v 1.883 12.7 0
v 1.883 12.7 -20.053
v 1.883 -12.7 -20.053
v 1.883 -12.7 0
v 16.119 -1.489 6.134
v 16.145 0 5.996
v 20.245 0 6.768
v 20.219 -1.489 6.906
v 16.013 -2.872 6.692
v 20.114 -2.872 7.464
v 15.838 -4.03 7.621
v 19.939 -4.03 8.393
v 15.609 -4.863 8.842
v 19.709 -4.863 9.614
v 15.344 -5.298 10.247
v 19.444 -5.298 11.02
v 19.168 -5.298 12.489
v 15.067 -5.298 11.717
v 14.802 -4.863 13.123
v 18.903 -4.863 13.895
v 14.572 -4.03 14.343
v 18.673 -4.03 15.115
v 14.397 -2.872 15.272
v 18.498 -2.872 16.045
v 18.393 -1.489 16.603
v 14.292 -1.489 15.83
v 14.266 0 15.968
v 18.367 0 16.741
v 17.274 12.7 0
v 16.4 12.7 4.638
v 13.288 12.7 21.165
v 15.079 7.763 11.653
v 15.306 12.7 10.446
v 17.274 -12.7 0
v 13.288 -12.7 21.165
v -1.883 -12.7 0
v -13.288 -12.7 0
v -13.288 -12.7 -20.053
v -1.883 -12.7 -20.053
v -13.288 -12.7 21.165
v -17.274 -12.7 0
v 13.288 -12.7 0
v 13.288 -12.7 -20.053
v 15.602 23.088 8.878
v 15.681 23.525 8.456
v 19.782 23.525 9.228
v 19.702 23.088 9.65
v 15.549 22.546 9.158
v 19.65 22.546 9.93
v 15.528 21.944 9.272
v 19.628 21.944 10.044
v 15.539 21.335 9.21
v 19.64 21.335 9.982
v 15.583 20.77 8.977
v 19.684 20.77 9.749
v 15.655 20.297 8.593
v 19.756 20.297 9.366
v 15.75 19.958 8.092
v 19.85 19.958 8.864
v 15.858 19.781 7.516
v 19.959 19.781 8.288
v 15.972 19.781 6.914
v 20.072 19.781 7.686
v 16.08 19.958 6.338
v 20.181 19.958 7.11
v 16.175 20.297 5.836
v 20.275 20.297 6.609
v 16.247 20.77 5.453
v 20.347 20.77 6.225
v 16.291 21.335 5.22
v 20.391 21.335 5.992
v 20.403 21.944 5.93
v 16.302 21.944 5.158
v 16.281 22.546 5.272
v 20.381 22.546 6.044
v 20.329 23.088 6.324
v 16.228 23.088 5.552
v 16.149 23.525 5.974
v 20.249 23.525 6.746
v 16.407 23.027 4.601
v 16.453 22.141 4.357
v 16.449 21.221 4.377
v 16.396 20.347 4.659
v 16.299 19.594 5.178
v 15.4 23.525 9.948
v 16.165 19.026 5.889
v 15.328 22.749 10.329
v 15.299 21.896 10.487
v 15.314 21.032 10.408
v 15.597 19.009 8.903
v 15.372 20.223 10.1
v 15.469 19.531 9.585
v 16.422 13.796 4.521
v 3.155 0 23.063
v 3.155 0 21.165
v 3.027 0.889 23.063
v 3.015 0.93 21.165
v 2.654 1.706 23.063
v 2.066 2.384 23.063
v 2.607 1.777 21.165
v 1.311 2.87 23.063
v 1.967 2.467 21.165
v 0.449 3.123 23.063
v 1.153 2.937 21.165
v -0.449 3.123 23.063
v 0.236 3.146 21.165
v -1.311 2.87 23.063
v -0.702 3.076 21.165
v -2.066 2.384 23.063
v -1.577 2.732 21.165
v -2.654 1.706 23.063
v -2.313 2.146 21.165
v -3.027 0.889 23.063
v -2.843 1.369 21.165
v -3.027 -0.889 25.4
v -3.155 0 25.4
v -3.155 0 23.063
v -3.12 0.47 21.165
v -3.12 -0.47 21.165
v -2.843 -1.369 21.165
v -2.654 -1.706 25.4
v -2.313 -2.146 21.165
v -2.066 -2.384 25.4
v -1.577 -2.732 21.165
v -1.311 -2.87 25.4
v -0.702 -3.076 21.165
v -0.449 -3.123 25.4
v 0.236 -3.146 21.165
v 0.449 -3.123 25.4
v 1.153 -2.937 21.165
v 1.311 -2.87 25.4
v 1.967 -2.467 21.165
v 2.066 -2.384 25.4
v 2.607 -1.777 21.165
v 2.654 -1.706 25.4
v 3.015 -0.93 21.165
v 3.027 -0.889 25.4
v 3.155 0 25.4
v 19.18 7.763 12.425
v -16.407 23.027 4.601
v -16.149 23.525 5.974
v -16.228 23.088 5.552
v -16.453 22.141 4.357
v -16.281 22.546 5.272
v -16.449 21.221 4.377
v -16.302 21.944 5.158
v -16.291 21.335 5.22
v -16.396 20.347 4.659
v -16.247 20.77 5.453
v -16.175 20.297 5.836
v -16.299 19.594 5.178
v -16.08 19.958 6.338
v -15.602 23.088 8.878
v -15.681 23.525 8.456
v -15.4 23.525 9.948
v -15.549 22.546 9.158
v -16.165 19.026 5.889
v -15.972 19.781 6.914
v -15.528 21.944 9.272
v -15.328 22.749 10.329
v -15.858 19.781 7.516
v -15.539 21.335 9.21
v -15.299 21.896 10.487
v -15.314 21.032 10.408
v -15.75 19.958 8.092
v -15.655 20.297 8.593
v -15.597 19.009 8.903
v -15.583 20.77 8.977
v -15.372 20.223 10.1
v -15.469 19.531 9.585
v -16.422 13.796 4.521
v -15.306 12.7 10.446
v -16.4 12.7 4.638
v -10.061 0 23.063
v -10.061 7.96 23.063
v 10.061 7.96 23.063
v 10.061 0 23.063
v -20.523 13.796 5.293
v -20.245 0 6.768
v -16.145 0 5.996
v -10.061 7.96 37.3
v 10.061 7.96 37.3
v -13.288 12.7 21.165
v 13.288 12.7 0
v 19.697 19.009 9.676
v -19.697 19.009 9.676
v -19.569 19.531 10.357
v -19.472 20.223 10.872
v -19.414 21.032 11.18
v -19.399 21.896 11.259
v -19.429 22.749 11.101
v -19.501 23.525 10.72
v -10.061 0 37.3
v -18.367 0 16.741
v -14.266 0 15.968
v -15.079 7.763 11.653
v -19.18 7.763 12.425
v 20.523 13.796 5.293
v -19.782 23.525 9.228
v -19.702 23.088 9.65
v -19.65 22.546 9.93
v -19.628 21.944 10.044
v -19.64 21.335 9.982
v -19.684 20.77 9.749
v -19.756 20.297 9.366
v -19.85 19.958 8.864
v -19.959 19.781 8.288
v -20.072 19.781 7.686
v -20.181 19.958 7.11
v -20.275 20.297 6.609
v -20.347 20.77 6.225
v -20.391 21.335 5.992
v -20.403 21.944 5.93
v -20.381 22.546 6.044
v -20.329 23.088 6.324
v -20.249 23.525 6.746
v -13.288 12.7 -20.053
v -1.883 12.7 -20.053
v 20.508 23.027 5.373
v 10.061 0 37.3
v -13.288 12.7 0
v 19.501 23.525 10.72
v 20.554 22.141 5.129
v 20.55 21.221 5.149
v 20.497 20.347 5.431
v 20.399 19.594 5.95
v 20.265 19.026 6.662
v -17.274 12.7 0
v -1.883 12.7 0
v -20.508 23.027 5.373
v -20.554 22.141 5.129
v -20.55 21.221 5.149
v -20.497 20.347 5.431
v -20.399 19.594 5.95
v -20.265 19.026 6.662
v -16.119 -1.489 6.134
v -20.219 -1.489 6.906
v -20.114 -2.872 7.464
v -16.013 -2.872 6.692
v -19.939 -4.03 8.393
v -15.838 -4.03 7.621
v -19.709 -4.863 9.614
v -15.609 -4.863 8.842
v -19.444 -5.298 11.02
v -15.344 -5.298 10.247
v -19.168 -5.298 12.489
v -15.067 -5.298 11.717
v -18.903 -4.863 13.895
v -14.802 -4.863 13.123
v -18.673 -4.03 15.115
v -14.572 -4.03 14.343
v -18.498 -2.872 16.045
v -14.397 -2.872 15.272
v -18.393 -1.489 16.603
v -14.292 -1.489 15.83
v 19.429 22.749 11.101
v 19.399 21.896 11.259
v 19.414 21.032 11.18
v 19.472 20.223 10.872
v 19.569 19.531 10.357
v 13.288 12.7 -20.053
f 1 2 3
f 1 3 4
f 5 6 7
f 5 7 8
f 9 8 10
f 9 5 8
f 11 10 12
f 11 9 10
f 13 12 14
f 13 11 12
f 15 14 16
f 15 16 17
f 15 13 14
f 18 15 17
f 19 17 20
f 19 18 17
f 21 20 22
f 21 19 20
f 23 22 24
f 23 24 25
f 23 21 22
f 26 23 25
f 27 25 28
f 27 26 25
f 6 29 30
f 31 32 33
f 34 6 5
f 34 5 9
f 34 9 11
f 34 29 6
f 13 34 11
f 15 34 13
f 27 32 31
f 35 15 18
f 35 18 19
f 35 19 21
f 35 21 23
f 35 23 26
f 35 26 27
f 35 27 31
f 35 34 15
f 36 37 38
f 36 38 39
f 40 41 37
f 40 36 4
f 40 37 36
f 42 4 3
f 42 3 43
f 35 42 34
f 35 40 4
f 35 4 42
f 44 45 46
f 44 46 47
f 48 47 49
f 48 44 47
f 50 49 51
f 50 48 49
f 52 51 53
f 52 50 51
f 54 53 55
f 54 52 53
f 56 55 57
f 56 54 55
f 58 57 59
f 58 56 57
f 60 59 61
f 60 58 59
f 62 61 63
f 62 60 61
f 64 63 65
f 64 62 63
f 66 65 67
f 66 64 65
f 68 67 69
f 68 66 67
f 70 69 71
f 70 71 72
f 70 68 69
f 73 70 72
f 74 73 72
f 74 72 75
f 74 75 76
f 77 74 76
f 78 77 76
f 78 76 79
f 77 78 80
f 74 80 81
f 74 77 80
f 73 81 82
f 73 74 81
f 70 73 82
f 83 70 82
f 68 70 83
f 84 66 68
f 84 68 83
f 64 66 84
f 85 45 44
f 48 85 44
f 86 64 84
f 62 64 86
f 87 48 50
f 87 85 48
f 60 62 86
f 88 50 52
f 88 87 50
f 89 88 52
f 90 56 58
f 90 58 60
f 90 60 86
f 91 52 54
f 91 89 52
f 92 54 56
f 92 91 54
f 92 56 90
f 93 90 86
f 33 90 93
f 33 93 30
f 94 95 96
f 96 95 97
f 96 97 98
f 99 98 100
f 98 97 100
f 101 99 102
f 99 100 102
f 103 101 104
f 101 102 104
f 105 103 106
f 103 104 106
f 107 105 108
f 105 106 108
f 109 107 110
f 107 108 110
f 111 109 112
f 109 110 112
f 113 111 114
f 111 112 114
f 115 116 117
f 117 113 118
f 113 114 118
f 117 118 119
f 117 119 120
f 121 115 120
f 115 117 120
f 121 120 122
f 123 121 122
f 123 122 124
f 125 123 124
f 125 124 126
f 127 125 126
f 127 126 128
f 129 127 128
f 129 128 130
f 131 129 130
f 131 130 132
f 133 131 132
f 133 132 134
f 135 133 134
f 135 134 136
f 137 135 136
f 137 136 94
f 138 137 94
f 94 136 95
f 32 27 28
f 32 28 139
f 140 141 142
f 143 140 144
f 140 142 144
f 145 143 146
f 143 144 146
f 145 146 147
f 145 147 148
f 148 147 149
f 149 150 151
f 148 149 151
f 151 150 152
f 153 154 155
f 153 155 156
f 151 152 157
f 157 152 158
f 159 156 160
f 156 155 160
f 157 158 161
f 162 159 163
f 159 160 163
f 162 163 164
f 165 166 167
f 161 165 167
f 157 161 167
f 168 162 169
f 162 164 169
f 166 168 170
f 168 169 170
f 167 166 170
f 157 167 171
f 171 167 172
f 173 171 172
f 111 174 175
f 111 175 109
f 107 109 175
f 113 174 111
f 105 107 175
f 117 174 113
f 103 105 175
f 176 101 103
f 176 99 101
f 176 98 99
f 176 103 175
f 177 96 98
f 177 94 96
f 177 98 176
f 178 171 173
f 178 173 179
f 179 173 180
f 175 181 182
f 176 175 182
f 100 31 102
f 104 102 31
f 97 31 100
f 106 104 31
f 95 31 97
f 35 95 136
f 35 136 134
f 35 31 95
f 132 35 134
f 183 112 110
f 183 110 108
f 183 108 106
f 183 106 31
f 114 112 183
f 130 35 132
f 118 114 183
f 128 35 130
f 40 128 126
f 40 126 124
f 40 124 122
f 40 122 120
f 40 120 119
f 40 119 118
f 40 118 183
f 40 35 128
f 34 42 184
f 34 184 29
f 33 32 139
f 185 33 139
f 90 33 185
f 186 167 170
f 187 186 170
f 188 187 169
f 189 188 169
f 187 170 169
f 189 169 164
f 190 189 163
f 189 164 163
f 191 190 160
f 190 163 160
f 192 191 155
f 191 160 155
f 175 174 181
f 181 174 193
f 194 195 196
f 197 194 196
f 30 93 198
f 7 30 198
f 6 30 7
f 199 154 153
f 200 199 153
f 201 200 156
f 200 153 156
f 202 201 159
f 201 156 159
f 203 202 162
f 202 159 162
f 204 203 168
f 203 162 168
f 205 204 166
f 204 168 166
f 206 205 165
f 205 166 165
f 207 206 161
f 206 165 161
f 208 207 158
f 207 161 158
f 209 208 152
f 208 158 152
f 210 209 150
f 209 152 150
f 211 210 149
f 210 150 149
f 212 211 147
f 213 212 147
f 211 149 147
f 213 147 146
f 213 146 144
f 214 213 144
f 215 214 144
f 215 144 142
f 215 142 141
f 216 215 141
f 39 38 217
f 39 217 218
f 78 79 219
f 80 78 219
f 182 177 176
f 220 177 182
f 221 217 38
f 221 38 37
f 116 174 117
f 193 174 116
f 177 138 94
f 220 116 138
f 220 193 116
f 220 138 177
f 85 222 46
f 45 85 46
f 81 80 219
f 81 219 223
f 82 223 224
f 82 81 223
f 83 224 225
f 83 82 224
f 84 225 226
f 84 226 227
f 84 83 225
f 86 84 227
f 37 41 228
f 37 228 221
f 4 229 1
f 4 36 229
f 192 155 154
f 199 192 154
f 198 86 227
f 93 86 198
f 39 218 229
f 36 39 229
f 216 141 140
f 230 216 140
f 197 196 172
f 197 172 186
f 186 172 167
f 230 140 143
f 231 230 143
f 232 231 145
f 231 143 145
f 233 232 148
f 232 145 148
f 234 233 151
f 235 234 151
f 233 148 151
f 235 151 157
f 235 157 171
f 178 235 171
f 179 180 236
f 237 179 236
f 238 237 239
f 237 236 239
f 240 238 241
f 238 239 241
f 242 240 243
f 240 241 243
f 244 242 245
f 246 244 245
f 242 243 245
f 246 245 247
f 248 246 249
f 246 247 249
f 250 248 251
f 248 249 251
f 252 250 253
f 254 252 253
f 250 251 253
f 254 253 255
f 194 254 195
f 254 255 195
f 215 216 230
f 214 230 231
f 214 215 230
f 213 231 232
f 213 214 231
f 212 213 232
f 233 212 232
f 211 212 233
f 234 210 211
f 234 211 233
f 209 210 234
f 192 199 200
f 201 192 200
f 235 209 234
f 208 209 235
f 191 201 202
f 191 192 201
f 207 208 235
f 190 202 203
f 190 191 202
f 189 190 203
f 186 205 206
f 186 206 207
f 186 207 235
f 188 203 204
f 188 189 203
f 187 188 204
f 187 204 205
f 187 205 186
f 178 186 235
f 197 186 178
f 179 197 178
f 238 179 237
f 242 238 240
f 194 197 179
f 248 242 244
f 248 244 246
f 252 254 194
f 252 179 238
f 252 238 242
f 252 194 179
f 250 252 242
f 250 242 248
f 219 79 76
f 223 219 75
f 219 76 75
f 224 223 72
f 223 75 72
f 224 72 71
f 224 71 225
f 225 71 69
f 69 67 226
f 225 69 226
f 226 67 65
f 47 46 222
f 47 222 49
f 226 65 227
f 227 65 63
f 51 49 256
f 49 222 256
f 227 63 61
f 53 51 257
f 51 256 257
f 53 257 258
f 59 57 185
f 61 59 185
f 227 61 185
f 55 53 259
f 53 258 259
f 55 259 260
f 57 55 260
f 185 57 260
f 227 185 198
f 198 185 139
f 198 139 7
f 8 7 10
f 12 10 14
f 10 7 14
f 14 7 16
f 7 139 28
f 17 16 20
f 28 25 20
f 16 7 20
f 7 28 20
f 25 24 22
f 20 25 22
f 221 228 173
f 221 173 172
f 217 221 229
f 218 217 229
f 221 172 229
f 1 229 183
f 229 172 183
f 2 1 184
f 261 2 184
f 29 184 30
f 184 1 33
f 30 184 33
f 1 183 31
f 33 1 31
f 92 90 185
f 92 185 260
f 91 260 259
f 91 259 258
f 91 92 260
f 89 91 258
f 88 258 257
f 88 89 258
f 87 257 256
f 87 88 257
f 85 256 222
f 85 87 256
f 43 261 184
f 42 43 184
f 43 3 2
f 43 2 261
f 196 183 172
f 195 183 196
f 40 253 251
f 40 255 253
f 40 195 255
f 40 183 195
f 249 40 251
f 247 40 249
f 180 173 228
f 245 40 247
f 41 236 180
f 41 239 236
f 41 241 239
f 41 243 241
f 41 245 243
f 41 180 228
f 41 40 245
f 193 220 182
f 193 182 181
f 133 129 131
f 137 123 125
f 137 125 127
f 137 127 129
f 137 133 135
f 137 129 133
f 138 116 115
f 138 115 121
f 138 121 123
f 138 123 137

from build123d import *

# Parameters (mm, degrees)
F0_W     = 11.4046361996
F0_H     = 20.0534798205
F1_DEPTH = 12.7
F3_DEPTH = 4.17264
F5_R     = 3.1549889686
F6_DEPTH = 25.4
F7_W     = 10.0605683401
F7_H     = 14.2366550863
F8_DEPTH = 7.95975


with BuildPart() as f1:
    # F0 (on Front) → F1 (new body, symmetric)
    with BuildSketch(Plane.XZ):
        Polygon((-13.2875442505, 21.1651604623), (-17.2738078982, 0), (-13.2875442505, 0), (-1.8829080509, 0), (0, 0), (0, 21.1651604623), align=None)
        with Locations((-7.5852261507, -10.0267399102)):
            Rectangle(F0_W, F0_H)
        Polygon((13.2875442505, 21.1651604623), (0, 21.1651604623), (0, 0), (1.8829080509, 0), (13.2875442505, 0), (17.2738078982, 0), align=None)
        with Locations((7.5852261507, -10.0267399102)):
            Rectangle(F0_W, F0_H)
    extrude(amount=F1_DEPTH, both=True)

    # F2 (on face) → F3 (join)
    with BuildSketch(Plane(origin=(-16.6820575494, 0, 3.1419123751), x_dir=(0, -1, 0), z_dir=(-0.982722195, 0, 0.1850867027))):
        with BuildLine():
            Line((-13.796438463, 1.4029195299), (0, 2.9041063972))
            ThreePointArc((0, 2.9041063972), (5.3533335924, 7.9779976513), (0, 13.0518889055))
            Line((0, 13.0518889055), (-7.7627915889, 8.660916239))
            Line((-7.7627915889, 8.660916239), (-19.0092052332, 5.8628071696))
            ThreePointArc((-19.0092052332, 5.8628071696), (-18.616808085, 4.3270320221), (-19.026460126, 2.7957691345))
            Line((-19.026460126, 2.7957691345), (-13.796438463, 1.4029195299))
        make_face()
        with BuildLine():
            ThreePointArc((-23.0272375047, 1.4844691614), (-20.7737198496, 1.3678224494), (-19.026460126, 2.7957691345))
            ThreePointArc((-19.026460126, 2.7957691345), (-18.616808085, 4.3270320221), (-19.0092052332, 5.8628071696))
            ThreePointArc((-19.0092052332, 5.8628071696), (-21.0317417116, 7.3939934823), (-23.5248878598, 6.9255838171))
            Line((-23.5248878598, 6.9255838171), (-23.5248878598, 5.4076067172))
            ThreePointArc((-23.5248878598, 5.4076067172), (-19.7584909862, 4.1445688112), (-23.5248878598, 2.8815309051))
            Line((-23.5248878598, 2.8815309051), (-23.0272375047, 1.4844691614))
        make_face()
    extrude(amount=F3_DEPTH)

    # F4: F1 across plane


with BuildPart() as f1_1:
    add(f1.part)
    add(f1.part.mirror(Plane.YZ))

    # F5 (on Top) → F6 (join)
    with BuildSketch(Plane.XY):
        Circle(F5_R)
    extrude(amount=F6_DEPTH)

    # F7 (on Front) → F8 (join)
    with BuildSketch(Plane.XZ):
        with Locations((5.0302841701, 30.1817078143)):
            Rectangle(F7_W, F7_H)
        with Locations((-5.0302841701, 30.1817078143)):
            Rectangle(F7_W, F7_H)
    extrude(amount=-F8_DEPTH)


solid = f1_1.part
